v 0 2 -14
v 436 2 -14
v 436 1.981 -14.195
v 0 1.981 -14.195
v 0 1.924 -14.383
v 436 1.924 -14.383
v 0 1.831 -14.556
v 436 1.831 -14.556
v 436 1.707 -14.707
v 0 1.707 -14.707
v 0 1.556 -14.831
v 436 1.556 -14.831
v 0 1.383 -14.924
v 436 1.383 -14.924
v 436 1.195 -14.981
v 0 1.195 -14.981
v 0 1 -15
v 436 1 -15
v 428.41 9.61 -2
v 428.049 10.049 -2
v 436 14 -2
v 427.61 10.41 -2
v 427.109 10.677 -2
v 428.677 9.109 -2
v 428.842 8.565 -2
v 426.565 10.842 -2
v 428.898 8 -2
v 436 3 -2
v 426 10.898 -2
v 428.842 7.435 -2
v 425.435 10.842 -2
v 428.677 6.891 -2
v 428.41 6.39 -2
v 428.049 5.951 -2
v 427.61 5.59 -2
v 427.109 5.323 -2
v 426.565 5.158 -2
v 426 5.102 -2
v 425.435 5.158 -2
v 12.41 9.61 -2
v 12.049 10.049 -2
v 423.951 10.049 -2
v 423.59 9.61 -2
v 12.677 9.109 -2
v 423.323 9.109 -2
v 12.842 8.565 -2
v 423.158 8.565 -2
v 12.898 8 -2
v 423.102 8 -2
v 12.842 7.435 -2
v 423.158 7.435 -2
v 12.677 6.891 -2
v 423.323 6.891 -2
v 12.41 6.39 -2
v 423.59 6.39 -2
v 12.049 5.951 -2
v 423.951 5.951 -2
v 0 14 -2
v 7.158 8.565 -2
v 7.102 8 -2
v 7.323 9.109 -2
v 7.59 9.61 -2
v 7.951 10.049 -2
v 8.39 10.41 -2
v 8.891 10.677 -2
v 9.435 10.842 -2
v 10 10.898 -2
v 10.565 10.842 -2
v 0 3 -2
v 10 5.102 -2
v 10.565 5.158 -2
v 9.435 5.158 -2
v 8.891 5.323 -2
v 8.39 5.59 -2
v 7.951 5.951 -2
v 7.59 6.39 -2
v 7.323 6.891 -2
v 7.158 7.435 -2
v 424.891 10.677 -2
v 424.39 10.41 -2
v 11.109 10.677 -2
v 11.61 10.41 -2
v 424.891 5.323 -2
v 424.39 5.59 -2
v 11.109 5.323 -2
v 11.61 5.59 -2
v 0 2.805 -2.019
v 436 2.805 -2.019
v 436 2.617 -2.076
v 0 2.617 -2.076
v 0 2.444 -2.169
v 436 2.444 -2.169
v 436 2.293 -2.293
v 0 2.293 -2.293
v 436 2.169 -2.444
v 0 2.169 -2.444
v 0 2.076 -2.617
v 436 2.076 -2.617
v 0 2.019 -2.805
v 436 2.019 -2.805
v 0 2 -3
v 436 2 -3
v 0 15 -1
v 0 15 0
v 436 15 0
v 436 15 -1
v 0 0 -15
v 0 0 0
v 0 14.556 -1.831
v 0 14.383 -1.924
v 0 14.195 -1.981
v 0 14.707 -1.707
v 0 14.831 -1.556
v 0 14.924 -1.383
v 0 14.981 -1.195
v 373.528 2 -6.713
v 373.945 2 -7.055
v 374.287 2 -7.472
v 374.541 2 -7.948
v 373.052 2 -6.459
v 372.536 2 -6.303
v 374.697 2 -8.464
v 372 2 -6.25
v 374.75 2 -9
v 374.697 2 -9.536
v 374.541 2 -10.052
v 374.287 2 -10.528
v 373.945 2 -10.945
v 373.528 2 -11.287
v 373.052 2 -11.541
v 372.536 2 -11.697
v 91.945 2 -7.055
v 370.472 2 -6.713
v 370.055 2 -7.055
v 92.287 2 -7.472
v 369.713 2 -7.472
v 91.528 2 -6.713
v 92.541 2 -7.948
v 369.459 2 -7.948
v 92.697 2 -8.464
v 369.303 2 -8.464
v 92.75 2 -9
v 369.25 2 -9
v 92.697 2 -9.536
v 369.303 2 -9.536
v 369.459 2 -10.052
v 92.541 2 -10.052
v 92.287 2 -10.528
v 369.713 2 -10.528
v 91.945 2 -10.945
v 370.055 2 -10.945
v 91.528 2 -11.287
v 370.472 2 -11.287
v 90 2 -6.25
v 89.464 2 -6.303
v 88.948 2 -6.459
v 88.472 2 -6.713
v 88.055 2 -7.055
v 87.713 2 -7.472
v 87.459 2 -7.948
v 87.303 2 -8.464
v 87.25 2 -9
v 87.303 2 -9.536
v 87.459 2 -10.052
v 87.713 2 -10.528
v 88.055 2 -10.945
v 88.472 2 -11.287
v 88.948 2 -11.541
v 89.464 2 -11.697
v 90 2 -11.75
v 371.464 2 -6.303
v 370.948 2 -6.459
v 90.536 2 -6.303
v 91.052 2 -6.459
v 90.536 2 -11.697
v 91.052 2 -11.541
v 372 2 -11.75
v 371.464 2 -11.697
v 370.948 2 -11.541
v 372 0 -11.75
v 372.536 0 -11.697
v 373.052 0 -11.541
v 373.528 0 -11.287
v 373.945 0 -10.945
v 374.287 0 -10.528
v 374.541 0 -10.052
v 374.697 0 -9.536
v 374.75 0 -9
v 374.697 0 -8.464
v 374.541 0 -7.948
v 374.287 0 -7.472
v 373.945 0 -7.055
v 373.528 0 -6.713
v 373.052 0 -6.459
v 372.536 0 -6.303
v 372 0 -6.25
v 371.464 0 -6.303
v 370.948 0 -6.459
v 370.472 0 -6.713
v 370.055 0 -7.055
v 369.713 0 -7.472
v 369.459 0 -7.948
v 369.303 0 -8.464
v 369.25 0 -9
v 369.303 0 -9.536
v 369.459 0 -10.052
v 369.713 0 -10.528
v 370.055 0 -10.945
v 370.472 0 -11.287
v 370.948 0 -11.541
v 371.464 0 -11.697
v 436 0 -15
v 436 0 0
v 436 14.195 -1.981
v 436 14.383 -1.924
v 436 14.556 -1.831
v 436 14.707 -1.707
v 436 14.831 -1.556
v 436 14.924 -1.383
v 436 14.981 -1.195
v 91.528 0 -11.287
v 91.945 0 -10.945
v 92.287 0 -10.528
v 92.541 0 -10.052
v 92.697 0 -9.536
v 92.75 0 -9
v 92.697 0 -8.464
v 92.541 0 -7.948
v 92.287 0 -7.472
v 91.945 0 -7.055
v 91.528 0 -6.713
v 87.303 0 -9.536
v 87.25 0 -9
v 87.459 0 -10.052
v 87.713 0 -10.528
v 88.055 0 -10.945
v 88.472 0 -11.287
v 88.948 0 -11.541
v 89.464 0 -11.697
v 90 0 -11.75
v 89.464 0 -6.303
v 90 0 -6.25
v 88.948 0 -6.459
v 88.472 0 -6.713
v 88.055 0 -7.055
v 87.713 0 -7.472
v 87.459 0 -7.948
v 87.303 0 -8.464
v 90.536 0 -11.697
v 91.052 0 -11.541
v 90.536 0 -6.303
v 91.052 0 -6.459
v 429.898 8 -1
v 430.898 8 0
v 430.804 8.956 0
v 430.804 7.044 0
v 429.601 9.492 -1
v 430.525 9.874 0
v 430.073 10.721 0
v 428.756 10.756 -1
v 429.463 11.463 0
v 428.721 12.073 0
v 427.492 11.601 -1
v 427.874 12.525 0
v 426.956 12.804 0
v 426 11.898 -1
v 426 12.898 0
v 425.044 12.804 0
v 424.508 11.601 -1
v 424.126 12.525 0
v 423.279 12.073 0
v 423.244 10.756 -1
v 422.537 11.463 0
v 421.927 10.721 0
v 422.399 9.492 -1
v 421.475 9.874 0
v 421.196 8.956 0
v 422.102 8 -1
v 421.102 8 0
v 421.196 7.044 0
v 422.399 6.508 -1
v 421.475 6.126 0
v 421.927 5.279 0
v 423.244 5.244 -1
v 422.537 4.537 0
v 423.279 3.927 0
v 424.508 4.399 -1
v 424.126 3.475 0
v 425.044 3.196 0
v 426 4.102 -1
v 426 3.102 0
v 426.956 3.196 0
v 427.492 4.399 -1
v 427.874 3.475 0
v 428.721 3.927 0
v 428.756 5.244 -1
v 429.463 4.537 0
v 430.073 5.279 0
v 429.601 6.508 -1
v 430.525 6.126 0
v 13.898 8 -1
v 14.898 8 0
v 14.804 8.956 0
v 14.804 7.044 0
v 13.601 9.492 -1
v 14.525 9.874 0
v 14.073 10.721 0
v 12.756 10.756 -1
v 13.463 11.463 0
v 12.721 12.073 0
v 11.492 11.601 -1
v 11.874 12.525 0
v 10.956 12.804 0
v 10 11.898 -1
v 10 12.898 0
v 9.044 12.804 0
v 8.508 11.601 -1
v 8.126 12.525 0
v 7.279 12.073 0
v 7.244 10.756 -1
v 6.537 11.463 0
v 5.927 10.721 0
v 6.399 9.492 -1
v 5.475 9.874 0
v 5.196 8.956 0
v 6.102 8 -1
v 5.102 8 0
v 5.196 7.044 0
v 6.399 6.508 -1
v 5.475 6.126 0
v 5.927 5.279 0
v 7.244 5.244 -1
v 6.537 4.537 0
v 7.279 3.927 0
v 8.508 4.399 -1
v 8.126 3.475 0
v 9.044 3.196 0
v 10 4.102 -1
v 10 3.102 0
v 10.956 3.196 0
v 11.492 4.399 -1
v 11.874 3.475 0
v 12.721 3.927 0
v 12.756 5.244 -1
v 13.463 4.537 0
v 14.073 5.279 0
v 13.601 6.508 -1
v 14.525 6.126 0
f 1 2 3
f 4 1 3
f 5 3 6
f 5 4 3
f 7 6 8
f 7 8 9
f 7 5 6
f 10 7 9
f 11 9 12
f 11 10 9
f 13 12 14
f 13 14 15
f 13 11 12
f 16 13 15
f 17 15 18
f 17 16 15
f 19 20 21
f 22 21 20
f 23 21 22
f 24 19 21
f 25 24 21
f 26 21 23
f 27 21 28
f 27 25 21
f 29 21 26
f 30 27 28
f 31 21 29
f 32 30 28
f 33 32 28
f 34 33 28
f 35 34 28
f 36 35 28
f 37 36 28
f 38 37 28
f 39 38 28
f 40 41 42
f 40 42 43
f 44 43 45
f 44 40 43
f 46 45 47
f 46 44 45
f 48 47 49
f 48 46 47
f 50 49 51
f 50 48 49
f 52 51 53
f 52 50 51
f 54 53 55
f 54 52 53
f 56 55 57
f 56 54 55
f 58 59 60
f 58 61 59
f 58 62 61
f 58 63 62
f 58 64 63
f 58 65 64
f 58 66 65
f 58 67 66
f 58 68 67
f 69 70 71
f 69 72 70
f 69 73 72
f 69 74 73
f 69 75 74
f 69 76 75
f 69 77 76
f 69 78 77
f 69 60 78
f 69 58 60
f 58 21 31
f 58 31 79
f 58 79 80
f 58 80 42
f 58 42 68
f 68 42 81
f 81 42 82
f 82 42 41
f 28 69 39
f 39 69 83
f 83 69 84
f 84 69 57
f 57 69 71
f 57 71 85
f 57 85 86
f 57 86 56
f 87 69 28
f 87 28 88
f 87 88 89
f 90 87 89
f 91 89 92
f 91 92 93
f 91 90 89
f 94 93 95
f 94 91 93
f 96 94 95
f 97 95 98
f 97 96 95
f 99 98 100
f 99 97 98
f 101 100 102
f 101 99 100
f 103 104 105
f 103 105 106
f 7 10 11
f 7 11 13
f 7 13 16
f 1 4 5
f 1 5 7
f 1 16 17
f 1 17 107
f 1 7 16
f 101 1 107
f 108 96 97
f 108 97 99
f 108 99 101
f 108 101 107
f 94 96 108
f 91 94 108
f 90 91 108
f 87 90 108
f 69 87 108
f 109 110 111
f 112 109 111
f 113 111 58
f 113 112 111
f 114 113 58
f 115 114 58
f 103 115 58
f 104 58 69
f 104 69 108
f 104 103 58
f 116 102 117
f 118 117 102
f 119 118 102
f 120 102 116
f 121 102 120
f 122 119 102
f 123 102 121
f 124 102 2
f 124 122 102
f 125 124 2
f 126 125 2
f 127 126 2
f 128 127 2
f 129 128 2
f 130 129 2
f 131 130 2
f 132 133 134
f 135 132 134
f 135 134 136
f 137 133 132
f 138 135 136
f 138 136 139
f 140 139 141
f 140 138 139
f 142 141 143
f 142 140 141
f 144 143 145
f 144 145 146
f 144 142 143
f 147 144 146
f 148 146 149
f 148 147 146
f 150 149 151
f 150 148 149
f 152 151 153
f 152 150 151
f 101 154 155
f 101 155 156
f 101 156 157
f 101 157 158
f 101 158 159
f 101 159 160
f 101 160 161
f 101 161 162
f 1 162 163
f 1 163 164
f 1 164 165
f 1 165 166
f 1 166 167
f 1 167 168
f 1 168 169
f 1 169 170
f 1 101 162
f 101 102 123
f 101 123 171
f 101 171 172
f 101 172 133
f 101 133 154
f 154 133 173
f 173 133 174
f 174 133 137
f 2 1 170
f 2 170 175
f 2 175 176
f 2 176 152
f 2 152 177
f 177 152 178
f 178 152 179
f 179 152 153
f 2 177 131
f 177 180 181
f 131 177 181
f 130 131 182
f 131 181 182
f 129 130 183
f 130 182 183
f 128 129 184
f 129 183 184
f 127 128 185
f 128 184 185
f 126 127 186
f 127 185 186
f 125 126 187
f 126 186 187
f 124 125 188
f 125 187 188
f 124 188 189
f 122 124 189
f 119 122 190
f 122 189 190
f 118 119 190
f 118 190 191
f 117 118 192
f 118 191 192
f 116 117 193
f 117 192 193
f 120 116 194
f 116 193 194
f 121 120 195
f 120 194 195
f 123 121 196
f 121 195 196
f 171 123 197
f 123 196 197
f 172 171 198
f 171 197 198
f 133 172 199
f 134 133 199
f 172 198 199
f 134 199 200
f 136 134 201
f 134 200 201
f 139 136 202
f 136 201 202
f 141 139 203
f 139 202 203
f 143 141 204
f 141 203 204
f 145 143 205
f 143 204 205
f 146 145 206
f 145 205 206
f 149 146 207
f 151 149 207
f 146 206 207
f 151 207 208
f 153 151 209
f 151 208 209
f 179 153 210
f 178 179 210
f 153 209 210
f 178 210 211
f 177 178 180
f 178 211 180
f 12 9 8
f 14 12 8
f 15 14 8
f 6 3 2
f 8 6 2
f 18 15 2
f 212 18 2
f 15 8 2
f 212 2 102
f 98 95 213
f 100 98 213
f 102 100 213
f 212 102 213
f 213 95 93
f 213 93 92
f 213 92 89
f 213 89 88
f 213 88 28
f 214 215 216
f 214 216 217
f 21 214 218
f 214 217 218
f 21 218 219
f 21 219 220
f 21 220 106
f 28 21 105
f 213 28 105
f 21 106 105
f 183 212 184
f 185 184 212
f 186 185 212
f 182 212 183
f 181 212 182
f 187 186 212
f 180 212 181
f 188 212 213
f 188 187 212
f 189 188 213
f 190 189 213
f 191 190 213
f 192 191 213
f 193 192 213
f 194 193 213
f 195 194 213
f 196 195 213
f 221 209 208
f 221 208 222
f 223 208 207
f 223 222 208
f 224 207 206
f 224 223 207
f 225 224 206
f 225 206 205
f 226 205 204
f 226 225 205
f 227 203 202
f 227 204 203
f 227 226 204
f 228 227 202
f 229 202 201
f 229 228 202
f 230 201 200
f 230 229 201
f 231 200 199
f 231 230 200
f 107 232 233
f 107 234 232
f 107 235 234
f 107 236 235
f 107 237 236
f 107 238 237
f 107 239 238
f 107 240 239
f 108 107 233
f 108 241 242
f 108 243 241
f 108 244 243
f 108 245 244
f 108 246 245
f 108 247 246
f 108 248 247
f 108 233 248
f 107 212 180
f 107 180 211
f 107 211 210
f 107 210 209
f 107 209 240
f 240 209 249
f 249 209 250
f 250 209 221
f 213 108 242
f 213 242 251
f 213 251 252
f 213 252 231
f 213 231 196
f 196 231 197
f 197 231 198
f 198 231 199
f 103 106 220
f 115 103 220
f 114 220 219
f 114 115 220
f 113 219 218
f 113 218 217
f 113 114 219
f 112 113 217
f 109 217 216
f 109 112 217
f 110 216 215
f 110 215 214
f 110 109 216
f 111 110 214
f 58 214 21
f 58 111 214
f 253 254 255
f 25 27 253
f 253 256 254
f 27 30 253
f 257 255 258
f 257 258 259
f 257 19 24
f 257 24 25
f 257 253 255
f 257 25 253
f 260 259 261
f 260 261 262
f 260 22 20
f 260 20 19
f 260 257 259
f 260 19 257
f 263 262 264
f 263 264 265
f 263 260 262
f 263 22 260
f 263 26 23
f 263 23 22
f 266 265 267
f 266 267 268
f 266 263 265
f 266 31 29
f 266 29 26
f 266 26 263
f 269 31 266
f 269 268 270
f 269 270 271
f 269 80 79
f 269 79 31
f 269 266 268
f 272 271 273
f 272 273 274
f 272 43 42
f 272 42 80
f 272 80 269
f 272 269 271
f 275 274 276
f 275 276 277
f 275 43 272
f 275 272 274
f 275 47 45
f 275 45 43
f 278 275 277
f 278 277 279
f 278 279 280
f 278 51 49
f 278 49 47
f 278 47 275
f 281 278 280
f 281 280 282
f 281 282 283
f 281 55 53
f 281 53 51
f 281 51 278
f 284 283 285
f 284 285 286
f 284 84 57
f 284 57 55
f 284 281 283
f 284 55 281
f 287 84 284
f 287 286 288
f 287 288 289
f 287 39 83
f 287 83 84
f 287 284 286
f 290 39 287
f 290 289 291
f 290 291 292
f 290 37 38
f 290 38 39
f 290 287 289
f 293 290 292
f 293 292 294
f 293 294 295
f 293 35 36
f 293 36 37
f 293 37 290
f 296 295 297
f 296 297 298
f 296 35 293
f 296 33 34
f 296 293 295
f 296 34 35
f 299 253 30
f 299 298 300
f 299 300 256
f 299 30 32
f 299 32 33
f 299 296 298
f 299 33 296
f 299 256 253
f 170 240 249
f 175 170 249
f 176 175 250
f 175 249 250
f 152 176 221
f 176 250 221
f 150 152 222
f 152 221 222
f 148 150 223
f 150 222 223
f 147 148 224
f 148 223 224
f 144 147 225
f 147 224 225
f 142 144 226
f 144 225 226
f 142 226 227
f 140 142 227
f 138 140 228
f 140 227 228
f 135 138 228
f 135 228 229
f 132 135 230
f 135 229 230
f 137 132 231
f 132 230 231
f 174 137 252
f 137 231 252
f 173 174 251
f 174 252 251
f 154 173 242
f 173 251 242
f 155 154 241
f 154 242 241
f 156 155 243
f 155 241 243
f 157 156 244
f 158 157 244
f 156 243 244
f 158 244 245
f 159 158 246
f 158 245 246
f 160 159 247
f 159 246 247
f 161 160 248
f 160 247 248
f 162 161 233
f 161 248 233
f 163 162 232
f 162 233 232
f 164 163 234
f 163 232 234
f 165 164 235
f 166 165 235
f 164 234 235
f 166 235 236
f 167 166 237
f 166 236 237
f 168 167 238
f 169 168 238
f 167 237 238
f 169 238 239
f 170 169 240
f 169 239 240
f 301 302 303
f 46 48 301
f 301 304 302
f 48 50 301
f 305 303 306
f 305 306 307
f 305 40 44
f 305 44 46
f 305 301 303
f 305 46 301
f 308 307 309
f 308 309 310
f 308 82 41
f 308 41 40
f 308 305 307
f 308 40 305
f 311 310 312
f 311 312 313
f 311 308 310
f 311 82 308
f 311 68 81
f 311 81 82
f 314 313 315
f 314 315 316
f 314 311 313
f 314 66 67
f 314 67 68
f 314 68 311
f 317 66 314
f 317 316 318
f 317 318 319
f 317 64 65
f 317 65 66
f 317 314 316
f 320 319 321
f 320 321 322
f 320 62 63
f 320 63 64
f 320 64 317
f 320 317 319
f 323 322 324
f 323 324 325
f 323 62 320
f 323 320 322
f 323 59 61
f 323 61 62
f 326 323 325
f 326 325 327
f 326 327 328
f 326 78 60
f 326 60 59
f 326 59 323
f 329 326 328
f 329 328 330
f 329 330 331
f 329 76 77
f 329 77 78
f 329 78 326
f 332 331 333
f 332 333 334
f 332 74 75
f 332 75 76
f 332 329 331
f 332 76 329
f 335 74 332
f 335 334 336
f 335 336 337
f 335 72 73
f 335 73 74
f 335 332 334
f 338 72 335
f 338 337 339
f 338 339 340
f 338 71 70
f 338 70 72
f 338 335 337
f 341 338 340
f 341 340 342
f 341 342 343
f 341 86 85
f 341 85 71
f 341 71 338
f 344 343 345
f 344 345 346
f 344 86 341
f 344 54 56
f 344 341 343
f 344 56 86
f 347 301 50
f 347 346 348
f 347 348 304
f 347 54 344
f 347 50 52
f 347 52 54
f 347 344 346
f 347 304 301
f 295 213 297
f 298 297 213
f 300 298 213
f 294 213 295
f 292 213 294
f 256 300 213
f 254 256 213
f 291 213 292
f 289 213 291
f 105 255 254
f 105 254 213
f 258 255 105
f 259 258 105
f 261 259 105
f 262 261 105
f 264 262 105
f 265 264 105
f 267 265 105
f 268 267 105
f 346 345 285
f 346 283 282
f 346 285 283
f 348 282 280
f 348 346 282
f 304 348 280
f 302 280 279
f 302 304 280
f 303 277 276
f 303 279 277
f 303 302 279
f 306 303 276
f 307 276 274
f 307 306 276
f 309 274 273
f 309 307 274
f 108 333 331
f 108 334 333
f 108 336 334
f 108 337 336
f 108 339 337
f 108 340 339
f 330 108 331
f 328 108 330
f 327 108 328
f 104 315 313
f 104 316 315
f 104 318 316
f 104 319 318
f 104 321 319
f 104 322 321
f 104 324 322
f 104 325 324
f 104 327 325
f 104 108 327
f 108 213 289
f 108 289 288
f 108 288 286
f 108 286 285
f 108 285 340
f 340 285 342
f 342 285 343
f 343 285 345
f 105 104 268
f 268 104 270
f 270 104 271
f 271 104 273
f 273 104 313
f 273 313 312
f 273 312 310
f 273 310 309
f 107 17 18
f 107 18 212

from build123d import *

# Parameters (mm, degrees)
EXTRUDE_1_DEPTH     = 436
SKETCH_4_R          = 2.75
CUT_EXTRUDE_3_DEPTH = 2
SKETCH_9_R          = 2.8
CUT_EXTRUDE_8_DEPTH = 437.515750002
CHAMFER_4_SIZE      = 2.098


with BuildPart() as part:
    # Эскиз1 → Бобышка-Вытянуть1 (new body)
    with BuildSketch(Plane(origin=(0, 0, 0), x_dir=(0, 0, -1), z_dir=(1, 0, 0))):
        with BuildLine():
            Line((0, 0), (0, 15))
            Line((0, 15), (1, 15))
            ThreePointArc((1, 15), (1.707106781, 14.707106781), (2, 14))
            Line((2, 14), (2, 3))
            ThreePointArc((2, 3), (2.292893219, 2.292893219), (3, 2))
            Line((3, 2), (14, 2))
            ThreePointArc((14, 2), (14.707106781, 1.707106781), (15, 1))
            Line((15, 1), (15, 0))
            Line((15, 0), (0, 0))
        make_face()
    extrude(amount=EXTRUDE_1_DEPTH)

    # Эскиз4 → Вырез-Вытянуть3 (cut)
    with BuildSketch(Plane.XZ):
        with Locations(Location((372, -9, 0), (0, 0, 270))):
            Circle(SKETCH_4_R)
        with Locations(Location((90, -9, 0), (0, 0, 270))):
            Circle(SKETCH_4_R)
    extrude(amount=-CUT_EXTRUDE_3_DEPTH, mode=Mode.SUBTRACT)

    # Эскиз9 → Вырез-Вытянуть8 (cut, through all)
    with BuildSketch(Plane.XY):
        with Locations((426, 8)):
            Circle(SKETCH_9_R)
        with Locations((10, 8)):
            Circle(SKETCH_9_R)
    extrude(amount=-CUT_EXTRUDE_8_DEPTH, mode=Mode.SUBTRACT)

    # Фаска4
    # the kernel refuses this chamfer: 2.098 mm, written as the material it takes off along each edge
    with BuildSketch(Plane(origin=(10, 8, 0), x_dir=(1, 0, 0), z_dir=(0, -1, 0))) as chamfer_4_piece_1:
        Polygon((2.8 + CHAMFER_4_SIZE, 0), (2.8, -CHAMFER_4_SIZE), (2.8, 0), align=None)
    revolve(axis=Axis((10, 8, 0), (0, 0, 1)), mode=Mode.SUBTRACT)
    with BuildSketch(Plane(origin=(426, 8, 0), x_dir=(1, 0, 0), z_dir=(0, -1, 0))) as chamfer_4_piece_2:
        Polygon((2.8 + CHAMFER_4_SIZE, 0), (2.8, -CHAMFER_4_SIZE), (2.8, 0), align=None)
    revolve(axis=Axis((426, 8, 0), (0, 0, 1)), mode=Mode.SUBTRACT)


solid = part.part
